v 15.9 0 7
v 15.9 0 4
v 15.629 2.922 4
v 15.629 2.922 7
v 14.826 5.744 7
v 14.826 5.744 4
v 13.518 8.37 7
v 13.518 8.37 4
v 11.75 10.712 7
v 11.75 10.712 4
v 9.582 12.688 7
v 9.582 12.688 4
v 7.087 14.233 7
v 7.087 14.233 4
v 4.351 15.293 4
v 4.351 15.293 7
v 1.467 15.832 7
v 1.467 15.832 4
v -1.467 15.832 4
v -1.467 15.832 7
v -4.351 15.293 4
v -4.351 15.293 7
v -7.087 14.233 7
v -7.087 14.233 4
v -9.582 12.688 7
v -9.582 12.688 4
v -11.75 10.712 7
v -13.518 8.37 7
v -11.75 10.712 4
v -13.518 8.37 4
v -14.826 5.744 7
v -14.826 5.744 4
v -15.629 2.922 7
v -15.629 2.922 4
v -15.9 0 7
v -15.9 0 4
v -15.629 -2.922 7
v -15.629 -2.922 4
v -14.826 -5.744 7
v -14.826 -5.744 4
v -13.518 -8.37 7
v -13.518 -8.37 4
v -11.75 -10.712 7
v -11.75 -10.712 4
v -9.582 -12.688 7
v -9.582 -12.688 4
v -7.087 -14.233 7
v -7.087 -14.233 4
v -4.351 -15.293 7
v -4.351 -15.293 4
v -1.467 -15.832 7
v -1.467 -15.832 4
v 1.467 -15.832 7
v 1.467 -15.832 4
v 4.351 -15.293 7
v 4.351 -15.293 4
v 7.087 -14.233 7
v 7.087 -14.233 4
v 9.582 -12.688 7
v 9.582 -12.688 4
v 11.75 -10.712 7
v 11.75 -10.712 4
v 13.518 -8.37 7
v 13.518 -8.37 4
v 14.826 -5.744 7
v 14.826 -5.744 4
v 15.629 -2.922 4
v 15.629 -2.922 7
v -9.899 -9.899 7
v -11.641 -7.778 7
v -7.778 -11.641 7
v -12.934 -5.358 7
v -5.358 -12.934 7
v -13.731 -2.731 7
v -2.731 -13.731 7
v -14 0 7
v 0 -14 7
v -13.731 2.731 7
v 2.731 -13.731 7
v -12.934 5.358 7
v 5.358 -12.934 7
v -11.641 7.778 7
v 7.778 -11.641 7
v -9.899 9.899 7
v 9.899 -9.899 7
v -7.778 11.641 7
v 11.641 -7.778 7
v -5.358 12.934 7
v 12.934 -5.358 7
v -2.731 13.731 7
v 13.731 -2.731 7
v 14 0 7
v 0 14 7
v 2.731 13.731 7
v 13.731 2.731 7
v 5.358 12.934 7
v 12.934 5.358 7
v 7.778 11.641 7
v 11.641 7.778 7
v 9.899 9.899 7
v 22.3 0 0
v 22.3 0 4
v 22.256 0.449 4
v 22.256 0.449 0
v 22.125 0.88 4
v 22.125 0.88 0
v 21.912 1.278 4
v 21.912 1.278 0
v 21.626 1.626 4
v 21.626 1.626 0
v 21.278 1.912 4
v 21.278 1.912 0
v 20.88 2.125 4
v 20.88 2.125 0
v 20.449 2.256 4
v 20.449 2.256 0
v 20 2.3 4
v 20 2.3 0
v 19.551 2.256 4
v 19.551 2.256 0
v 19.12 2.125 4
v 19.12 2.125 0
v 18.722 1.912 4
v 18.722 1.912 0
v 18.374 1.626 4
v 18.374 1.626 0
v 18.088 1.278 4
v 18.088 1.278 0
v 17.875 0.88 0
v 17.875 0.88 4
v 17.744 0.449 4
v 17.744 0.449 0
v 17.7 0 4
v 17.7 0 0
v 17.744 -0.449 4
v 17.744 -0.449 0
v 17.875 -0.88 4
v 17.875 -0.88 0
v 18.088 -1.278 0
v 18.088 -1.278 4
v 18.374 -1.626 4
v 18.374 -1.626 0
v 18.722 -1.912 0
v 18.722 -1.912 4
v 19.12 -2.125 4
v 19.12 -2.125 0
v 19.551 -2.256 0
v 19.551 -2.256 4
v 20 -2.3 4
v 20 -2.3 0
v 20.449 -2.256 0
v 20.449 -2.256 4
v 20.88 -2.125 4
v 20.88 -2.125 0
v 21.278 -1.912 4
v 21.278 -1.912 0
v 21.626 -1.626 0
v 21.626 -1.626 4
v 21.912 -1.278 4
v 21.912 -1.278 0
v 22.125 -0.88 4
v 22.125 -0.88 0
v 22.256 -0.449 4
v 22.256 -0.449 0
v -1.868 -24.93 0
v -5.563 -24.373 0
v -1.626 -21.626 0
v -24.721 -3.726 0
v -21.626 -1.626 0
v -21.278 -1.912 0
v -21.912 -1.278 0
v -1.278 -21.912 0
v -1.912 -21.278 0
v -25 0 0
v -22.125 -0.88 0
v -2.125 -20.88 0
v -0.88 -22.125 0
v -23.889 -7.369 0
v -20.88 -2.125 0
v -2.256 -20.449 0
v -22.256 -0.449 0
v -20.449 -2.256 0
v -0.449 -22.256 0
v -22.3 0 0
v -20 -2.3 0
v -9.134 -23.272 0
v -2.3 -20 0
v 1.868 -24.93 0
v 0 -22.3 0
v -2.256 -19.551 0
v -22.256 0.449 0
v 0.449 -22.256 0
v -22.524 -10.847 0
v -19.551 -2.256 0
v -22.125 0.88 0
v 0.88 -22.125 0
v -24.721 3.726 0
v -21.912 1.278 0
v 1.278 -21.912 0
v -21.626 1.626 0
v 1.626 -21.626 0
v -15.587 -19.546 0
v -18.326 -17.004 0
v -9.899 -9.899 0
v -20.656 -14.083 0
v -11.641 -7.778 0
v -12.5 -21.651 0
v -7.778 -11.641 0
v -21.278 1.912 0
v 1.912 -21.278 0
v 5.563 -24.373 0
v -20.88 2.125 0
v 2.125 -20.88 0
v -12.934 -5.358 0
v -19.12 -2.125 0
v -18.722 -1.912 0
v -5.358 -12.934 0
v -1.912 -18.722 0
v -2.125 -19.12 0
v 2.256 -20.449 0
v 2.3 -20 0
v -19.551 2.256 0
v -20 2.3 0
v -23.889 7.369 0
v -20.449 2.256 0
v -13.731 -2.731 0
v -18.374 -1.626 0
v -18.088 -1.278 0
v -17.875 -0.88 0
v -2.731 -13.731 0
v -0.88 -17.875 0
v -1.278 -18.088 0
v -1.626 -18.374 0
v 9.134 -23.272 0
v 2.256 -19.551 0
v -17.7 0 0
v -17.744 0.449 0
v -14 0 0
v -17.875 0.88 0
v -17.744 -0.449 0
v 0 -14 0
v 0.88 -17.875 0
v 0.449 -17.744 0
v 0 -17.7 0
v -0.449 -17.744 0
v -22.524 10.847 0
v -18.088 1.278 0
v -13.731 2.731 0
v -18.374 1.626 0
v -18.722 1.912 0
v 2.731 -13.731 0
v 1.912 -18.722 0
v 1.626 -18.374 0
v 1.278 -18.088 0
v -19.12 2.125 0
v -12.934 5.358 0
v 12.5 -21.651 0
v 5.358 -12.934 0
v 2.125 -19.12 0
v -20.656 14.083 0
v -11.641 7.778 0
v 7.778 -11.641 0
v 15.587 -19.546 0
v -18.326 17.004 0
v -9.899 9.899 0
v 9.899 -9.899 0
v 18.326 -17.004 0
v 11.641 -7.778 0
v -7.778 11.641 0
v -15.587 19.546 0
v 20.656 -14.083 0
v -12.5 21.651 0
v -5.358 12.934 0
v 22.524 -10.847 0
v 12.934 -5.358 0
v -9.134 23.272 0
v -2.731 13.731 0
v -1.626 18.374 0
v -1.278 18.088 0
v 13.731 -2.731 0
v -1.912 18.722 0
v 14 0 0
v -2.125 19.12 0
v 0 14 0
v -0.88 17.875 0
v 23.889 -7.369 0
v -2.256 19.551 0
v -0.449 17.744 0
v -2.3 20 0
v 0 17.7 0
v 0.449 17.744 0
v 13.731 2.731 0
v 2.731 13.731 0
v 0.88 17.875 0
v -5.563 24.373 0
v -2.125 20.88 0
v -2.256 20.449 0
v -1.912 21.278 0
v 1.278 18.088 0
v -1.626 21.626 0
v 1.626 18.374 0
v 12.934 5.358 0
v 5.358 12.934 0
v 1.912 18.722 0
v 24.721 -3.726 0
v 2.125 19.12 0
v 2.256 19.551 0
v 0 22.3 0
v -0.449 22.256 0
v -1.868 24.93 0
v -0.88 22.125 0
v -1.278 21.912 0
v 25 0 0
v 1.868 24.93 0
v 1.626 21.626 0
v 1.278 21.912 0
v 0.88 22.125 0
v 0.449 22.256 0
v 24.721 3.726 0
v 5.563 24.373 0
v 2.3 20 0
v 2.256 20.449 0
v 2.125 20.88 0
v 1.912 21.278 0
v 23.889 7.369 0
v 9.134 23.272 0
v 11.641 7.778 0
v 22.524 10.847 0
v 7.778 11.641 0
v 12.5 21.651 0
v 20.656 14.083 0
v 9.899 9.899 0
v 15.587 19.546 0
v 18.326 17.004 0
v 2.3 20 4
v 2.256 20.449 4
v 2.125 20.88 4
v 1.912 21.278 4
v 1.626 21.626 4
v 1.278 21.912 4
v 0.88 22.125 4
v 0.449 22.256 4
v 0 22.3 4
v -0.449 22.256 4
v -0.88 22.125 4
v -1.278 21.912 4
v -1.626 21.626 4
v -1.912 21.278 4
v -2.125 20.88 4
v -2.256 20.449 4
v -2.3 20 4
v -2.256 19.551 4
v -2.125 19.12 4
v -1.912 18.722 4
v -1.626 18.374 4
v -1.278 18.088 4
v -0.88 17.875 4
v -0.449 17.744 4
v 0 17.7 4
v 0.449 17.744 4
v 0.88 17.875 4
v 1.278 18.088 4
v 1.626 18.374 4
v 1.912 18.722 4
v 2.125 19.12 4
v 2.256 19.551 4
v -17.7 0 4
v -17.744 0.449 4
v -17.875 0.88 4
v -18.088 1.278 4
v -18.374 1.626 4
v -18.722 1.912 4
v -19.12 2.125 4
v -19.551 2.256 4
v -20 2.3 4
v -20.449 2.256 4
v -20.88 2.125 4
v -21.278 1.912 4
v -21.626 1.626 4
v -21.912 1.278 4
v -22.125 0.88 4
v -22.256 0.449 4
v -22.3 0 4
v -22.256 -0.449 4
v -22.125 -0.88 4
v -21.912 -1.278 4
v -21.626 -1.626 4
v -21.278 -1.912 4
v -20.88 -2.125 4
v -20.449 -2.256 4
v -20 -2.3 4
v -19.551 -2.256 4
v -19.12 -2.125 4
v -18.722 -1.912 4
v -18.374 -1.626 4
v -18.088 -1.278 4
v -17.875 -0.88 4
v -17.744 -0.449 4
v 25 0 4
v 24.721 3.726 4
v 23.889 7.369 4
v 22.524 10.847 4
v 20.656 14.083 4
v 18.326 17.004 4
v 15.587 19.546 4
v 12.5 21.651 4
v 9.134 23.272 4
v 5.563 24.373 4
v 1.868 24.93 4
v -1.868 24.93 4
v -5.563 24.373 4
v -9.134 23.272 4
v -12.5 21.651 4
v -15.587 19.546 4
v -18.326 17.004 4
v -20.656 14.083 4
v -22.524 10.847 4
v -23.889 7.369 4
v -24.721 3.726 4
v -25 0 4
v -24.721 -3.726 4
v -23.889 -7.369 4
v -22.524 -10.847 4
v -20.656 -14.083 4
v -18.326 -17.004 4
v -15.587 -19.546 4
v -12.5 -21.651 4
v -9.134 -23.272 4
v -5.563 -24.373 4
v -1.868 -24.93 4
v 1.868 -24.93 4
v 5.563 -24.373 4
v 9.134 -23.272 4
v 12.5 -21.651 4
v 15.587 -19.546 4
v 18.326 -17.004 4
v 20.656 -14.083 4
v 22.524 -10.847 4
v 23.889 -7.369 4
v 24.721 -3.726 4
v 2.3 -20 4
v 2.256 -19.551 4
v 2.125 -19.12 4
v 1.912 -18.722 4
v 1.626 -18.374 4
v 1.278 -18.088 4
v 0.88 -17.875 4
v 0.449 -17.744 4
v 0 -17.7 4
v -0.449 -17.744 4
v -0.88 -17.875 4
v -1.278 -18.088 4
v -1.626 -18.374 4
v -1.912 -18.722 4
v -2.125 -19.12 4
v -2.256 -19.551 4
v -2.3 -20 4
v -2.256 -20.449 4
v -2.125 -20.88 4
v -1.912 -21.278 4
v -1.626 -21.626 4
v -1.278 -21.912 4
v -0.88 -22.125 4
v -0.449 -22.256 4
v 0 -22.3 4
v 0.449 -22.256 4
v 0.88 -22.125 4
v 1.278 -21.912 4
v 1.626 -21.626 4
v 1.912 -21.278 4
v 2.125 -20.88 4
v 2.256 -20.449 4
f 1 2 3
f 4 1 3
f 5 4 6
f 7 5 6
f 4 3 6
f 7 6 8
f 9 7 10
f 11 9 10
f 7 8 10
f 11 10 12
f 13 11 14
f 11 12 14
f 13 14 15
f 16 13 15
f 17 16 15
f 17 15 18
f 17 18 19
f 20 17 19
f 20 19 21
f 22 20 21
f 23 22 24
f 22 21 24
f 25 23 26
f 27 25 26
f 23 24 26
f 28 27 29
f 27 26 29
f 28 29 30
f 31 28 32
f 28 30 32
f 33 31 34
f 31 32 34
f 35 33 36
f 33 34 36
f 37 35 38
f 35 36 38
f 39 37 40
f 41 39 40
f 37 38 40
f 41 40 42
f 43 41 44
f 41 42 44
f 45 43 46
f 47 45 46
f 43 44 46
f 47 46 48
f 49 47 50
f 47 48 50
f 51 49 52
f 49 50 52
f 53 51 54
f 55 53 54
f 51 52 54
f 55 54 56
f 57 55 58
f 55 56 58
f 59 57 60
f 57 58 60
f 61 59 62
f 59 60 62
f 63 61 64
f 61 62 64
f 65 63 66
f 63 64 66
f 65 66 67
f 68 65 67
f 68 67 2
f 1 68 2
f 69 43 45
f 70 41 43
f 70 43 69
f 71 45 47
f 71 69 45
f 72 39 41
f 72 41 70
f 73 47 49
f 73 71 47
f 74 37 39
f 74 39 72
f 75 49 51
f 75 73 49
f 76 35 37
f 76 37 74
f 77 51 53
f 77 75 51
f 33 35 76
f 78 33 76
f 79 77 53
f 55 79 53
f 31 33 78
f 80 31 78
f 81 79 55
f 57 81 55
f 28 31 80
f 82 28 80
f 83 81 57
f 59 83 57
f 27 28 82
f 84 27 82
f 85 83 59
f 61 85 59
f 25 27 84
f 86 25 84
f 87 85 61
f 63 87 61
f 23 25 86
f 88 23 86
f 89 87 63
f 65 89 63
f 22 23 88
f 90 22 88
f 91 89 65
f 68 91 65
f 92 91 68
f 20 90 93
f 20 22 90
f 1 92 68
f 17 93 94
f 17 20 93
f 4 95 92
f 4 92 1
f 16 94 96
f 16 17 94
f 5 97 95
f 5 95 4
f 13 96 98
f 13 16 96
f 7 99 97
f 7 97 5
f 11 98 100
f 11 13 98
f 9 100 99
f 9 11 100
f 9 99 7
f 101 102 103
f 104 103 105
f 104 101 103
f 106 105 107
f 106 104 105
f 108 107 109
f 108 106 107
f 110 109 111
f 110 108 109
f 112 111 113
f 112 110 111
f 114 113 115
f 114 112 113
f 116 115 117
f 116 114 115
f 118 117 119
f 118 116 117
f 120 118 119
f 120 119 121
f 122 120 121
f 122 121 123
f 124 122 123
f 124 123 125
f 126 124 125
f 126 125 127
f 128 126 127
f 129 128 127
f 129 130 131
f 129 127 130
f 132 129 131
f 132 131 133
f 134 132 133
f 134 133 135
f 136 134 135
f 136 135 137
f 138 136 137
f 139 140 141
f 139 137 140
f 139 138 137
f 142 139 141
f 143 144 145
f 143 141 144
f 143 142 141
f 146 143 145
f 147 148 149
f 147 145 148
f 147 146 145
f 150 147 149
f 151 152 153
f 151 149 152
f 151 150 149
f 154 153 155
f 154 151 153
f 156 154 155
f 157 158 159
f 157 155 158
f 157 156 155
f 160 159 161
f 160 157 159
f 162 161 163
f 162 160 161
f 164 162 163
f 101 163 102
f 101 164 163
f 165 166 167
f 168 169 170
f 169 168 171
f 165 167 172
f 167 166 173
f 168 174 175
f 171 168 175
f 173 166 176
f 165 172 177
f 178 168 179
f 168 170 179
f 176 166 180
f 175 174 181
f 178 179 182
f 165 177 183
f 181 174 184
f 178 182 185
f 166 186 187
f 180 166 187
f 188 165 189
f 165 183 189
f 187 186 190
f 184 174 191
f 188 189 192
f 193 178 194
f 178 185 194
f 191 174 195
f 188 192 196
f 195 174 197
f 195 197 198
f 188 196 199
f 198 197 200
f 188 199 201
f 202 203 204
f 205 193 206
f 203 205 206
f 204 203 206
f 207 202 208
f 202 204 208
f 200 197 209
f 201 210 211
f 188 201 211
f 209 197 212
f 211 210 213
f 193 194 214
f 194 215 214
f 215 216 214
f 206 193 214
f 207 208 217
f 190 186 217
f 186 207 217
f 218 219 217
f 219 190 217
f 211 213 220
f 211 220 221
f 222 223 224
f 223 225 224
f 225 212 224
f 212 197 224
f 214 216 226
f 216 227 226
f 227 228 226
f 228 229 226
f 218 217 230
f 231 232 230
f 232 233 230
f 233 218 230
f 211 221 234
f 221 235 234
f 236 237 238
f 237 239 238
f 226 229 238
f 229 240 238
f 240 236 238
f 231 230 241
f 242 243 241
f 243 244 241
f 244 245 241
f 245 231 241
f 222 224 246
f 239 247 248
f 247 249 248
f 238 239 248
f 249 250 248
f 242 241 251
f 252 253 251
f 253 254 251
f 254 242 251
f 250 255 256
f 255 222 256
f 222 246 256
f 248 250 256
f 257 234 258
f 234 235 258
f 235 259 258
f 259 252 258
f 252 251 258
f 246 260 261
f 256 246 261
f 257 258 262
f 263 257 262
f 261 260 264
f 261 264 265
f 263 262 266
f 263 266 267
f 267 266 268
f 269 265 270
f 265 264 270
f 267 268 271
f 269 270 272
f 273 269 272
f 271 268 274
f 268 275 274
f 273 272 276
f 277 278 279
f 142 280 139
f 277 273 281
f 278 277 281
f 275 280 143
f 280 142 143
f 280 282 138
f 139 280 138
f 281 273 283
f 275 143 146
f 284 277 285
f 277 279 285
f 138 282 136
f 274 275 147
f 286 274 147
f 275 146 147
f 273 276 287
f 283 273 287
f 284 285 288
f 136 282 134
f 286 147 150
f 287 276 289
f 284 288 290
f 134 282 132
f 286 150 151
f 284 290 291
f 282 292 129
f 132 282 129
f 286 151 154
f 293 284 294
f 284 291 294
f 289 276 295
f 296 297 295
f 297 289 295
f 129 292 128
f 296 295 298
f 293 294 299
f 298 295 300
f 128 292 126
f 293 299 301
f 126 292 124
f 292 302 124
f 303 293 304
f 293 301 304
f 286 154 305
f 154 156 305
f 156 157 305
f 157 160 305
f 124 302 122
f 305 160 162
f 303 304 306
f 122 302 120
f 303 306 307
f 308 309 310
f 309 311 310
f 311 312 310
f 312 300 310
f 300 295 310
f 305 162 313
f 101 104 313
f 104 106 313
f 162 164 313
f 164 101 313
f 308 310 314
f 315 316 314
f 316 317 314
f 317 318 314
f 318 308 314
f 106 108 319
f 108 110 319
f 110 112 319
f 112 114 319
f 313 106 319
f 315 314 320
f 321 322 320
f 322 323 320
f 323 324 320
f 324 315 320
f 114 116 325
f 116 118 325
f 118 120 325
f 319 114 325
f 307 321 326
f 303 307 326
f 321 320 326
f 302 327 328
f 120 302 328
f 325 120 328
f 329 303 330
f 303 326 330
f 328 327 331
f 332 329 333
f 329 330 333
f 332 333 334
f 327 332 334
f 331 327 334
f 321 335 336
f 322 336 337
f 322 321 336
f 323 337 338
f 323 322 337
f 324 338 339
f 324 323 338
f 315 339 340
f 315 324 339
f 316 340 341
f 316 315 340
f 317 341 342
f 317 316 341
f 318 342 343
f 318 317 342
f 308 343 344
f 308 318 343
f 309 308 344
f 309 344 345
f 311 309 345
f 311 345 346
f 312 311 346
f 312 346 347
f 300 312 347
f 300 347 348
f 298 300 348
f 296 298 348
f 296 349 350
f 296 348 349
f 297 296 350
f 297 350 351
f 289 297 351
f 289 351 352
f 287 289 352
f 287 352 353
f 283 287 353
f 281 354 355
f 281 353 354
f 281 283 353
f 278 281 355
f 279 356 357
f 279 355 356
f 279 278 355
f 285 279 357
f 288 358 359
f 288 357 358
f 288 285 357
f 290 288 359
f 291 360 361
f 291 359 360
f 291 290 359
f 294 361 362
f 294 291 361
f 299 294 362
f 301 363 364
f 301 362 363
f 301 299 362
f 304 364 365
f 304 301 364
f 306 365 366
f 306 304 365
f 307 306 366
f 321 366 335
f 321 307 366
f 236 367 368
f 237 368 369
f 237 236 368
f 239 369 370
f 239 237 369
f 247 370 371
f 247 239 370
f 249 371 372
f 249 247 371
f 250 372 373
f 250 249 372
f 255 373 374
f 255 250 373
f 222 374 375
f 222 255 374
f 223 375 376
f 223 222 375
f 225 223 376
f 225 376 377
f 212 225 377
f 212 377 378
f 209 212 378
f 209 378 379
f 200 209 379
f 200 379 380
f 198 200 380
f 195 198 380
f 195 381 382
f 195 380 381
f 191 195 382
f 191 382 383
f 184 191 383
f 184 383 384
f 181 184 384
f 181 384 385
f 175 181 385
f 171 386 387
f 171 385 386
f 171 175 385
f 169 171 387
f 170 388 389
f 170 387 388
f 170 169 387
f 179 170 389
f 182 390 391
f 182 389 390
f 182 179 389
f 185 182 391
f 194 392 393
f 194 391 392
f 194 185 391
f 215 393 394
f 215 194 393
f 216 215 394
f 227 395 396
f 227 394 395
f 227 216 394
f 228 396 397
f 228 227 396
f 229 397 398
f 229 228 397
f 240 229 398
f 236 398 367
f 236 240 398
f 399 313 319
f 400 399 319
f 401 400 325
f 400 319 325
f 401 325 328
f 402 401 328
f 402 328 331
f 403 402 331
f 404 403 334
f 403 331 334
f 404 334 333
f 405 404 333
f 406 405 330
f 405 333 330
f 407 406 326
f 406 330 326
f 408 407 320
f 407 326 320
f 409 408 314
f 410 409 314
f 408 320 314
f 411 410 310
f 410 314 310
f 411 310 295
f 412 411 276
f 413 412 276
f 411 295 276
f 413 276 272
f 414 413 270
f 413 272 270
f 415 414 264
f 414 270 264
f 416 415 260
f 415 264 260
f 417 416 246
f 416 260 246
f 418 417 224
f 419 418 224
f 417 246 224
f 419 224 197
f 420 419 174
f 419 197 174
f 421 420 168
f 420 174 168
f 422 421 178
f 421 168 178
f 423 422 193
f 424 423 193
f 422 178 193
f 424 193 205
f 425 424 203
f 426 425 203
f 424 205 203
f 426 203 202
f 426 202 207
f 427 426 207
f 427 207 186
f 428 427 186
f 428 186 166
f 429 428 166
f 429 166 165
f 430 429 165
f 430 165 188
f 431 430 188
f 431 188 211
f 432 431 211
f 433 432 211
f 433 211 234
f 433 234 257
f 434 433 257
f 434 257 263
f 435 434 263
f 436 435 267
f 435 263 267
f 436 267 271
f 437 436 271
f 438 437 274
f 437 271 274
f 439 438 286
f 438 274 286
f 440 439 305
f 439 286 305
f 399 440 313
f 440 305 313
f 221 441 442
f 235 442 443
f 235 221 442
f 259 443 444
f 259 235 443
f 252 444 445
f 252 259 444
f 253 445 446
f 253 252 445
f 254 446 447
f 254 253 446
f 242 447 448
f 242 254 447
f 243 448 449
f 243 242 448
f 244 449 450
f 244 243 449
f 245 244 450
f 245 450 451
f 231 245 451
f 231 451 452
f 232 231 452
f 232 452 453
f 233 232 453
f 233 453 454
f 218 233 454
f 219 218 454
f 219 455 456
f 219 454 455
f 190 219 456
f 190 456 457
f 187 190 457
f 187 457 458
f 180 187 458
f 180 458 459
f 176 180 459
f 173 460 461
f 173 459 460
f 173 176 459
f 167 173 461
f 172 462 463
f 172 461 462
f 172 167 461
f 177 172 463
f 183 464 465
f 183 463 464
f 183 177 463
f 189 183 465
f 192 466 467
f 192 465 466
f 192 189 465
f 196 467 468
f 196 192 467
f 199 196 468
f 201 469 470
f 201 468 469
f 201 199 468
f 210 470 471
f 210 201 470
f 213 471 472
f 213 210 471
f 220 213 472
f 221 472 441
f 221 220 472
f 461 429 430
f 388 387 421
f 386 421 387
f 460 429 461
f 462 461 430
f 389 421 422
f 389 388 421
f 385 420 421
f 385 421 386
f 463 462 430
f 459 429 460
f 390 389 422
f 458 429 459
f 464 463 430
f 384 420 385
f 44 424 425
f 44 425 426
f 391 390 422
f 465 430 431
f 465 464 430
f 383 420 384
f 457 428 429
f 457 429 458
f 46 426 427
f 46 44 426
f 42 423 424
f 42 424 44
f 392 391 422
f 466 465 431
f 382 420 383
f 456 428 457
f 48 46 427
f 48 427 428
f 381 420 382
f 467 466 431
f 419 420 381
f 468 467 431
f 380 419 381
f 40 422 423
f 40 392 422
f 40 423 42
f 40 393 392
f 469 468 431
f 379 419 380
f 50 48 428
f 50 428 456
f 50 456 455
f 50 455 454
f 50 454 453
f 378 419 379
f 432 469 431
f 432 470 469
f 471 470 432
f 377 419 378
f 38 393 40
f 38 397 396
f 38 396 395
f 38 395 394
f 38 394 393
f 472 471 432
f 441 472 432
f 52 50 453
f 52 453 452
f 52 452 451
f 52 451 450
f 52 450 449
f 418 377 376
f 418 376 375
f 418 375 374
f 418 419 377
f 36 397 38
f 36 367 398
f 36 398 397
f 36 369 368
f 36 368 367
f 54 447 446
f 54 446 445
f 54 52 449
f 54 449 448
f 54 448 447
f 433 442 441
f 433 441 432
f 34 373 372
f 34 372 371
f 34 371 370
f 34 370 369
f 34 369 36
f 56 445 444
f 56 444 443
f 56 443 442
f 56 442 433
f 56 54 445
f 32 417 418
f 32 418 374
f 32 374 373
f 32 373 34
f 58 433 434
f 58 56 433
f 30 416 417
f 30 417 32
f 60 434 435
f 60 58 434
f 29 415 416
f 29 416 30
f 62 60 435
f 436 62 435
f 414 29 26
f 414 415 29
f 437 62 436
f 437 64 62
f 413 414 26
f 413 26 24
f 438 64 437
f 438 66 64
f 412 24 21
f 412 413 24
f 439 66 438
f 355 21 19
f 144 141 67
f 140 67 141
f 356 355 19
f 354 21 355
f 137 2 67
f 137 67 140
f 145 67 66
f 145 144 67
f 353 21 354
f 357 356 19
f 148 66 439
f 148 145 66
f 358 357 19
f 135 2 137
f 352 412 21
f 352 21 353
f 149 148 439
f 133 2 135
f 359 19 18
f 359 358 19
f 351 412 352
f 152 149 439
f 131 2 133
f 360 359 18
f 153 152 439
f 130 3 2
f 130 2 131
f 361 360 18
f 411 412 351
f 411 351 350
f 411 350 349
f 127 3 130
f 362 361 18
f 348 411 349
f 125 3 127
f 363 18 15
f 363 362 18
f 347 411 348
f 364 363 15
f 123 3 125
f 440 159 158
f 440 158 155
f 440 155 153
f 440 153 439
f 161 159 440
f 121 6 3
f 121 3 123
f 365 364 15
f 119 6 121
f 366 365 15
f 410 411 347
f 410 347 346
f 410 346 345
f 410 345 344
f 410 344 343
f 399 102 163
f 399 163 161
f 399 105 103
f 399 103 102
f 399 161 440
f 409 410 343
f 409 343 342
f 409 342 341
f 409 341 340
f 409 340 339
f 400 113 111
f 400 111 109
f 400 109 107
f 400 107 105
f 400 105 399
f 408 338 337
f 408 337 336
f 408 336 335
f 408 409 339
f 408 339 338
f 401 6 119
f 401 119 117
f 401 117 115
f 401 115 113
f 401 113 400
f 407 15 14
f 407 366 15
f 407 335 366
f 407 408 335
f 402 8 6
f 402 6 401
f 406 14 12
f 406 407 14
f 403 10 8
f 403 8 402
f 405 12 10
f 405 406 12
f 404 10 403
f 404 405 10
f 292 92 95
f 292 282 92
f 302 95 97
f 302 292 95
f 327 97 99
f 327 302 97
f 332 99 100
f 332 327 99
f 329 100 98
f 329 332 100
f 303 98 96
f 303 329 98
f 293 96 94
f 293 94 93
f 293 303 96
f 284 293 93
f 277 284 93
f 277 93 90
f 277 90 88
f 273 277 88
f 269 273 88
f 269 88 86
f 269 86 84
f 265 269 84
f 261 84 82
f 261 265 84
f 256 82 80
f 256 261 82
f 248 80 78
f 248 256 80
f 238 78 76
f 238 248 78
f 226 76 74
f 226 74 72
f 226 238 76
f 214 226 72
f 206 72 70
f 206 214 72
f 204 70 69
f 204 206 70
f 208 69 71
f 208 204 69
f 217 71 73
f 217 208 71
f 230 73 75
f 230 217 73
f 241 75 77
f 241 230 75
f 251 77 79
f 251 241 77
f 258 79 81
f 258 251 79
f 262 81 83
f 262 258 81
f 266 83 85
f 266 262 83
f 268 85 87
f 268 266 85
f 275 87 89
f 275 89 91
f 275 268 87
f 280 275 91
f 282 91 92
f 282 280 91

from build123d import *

# Parameters (mm, degrees)
SKETCH006_R      = 15.9
SKETCH006_R_2    = 14
EXTRUDE006_DEPTH = 3
SKETCH005_R      = 2.3
EXTRUDE005_DEPTH = 12
SKETCH004_R      = 25
SKETCH004_R_2    = 14
EXTRUDE004_DEPTH = 4


with BuildPart() as extrude006:
    # Sketch006 → Extrude006 (new body)
    with BuildSketch(Plane.XY):
        Circle(SKETCH006_R)
        Circle(SKETCH006_R_2, mode=Mode.SUBTRACT)
    extrude(amount=EXTRUDE006_DEPTH)


with BuildPart() as extrude006_1:
    # Extrude006 placement: moved
    add(extrude006.part.moved(Location((0, 0, 4))))


with BuildPart() as extrude005:
    # Sketch005 → Extrude005 (new body)
    with BuildSketch(Plane.XY):
        with Locations((-20, 0)):
            Circle(SKETCH005_R)
        with Locations((0, -20)):
            Circle(SKETCH005_R)
        with Locations((20, 0)):
            Circle(SKETCH005_R)
        with Locations((0, 20)):
            Circle(SKETCH005_R)
    extrude(amount=EXTRUDE005_DEPTH)


with BuildPart() as fusion:
    # Sketch004 → Extrude004 (new body)
    with BuildSketch(Plane.XY):
        Circle(SKETCH004_R)
        Circle(SKETCH004_R_2, mode=Mode.SUBTRACT)
    extrude(amount=EXTRUDE004_DEPTH)

    # Cut: cut Extrude005
    add(extrude005.part, mode=Mode.SUBTRACT)

    # Fusion: union Extrude006
    add(extrude006_1.part)


solid = fusion.part
